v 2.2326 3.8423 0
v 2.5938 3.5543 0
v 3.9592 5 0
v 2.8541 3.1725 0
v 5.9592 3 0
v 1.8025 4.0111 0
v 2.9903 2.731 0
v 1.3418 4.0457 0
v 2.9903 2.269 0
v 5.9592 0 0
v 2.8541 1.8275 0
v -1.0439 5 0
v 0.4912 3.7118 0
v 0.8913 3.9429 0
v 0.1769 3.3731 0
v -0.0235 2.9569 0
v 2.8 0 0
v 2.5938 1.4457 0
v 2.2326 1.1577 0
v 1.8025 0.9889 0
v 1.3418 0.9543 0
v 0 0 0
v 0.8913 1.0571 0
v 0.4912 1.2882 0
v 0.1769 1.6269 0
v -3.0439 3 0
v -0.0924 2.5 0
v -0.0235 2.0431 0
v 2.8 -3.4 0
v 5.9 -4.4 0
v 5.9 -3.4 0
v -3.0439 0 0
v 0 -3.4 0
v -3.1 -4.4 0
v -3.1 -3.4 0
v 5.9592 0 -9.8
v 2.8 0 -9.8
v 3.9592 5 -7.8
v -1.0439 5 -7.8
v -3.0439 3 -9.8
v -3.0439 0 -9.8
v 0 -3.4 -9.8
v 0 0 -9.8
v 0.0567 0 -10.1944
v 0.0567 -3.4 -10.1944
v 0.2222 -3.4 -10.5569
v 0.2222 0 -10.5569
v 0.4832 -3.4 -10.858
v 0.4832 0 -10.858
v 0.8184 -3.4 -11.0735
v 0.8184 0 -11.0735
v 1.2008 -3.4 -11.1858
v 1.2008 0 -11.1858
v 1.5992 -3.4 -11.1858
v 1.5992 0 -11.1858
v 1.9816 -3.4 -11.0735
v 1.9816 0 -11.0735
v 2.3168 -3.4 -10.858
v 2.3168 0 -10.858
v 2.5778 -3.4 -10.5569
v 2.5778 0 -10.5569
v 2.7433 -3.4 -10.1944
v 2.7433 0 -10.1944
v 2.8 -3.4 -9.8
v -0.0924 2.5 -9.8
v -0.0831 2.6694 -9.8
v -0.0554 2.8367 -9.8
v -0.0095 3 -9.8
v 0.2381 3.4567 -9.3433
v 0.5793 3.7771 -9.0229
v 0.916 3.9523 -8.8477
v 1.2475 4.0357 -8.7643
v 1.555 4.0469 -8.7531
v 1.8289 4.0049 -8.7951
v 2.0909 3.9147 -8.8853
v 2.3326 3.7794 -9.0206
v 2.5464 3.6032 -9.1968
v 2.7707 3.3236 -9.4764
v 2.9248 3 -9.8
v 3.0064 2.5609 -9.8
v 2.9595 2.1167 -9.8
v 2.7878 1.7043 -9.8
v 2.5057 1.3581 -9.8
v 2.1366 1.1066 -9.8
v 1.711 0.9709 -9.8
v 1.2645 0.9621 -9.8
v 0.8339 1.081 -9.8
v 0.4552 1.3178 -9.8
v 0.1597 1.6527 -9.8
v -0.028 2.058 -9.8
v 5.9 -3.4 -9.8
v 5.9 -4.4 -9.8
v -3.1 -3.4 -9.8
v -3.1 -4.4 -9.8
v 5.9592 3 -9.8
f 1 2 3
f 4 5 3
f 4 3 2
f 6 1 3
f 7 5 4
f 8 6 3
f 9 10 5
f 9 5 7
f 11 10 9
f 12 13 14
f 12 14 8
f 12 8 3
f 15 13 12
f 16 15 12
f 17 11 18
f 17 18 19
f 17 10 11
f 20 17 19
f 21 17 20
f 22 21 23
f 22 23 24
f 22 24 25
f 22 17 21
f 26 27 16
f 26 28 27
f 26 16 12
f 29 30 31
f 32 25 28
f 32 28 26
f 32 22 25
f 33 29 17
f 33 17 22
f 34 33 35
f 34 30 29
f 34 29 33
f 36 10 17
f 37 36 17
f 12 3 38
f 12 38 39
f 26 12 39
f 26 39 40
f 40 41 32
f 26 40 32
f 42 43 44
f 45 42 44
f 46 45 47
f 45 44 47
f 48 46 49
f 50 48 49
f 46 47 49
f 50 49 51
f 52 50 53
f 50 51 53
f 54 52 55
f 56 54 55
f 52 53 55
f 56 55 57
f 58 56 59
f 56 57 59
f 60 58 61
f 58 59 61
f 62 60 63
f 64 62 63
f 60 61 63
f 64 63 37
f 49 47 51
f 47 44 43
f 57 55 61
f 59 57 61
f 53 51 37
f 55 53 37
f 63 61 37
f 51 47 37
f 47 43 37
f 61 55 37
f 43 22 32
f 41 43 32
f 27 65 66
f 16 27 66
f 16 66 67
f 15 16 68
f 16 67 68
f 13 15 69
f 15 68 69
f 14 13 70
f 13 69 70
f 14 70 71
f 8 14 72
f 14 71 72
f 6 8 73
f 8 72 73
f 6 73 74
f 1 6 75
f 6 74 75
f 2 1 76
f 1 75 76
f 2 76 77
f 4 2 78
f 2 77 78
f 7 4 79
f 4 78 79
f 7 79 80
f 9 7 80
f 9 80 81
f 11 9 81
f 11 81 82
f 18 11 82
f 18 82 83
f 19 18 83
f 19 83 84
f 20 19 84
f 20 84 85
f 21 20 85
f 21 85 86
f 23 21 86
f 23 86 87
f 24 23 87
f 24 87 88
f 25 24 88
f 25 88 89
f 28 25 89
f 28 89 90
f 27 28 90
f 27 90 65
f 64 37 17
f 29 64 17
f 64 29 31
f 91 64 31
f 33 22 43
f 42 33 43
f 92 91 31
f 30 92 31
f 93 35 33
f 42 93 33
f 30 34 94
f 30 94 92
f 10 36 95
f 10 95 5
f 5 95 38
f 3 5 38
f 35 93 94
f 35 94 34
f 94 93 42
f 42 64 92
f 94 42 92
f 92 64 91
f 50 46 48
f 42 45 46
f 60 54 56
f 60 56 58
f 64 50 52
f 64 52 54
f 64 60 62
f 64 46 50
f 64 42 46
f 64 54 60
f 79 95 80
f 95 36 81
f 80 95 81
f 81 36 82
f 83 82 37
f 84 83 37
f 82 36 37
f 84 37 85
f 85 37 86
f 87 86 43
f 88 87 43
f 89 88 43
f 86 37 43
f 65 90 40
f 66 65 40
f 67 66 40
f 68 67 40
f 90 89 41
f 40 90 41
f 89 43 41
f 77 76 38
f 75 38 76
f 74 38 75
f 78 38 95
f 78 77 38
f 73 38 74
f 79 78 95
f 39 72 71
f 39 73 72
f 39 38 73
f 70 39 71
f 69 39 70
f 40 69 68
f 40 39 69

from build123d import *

# Parameters (mm, degrees)
F1_DEPTH    = 3.4
F2_W        = 9
F2_H        = 9.8
F3_DEPTH    = 1
F4_W        = 9.0031104628
F4_H        = 9.8
F5_DEPTH    = 5
F7_D        = 3.1
F8_T1_DEPTH = 20.0867319519
F8_T3_DEPTH = 19.2898424147


# Not quite as in the source:
# - a fillet or chamfer that OpenCascade refuses, or shapes differently, is made with other operations: its cross-section is extruded or revolved along the edge and cut away or added


with BuildPart() as f1:
    # F0 (on Front) → F1 (new body)
    with BuildSketch(Plane.XZ):
        with BuildLine():
            Line((2.8, 0), (0, 0))
            Line((0, 0), (0, -9.8))
            ThreePointArc((0, -9.8), (1.4, -11.2), (2.8, -9.8))
            Line((2.8, -9.8), (2.8, 0))
        make_face()
    extrude(amount=F1_DEPTH)

    # F2 (on face) → F3 (join)
    with BuildSketch(Plane.XZ.offset(3.4)):
        with Locations((1.4, -4.9)):
            Rectangle(F2_W, F2_H)
    extrude(amount=F3_DEPTH)

    # F4 (on face) → F5 (join)
    with BuildSketch(Plane(origin=(0, 0, 0), x_dir=(-1, 0, 0), z_dir=(0, 1, 0))):
        with Locations((-1.4576160967, -4.9)):
            Rectangle(F4_W, F4_H)
    extrude(amount=F5_DEPTH)

    # F7 (through all)
    with Locations(Plane.XY):
        with Locations((1.4576160967, 2.5)):
            Hole(F7_D / 2)

    # F8: chamfer of 2 on 3 edges, made by hand

    # F8_s2 → F8_t1 (cut)
    with BuildSketch(Plane.XY.offset(-14.9433659759)):
        Polygon((-1.0439391347, 5), (-3.0439391347, 3), (-3.0439391347, 5), align=None)
        Polygon((5.9591713281, 3), (3.9591713281, 5), (5.9591713281, 5), align=None)
    extrude(amount=F8_T1_DEPTH, mode=Mode.SUBTRACT)

    # F8_s4 → F8_t3 (cut)
    with BuildSketch(Plane.YZ.offset(-8.1873051107)):
        Polygon((5, -7.8), (3, -9.8), (5, -9.8), align=None)
    extrude(amount=F8_T3_DEPTH, mode=Mode.SUBTRACT)


solid = f1.part
